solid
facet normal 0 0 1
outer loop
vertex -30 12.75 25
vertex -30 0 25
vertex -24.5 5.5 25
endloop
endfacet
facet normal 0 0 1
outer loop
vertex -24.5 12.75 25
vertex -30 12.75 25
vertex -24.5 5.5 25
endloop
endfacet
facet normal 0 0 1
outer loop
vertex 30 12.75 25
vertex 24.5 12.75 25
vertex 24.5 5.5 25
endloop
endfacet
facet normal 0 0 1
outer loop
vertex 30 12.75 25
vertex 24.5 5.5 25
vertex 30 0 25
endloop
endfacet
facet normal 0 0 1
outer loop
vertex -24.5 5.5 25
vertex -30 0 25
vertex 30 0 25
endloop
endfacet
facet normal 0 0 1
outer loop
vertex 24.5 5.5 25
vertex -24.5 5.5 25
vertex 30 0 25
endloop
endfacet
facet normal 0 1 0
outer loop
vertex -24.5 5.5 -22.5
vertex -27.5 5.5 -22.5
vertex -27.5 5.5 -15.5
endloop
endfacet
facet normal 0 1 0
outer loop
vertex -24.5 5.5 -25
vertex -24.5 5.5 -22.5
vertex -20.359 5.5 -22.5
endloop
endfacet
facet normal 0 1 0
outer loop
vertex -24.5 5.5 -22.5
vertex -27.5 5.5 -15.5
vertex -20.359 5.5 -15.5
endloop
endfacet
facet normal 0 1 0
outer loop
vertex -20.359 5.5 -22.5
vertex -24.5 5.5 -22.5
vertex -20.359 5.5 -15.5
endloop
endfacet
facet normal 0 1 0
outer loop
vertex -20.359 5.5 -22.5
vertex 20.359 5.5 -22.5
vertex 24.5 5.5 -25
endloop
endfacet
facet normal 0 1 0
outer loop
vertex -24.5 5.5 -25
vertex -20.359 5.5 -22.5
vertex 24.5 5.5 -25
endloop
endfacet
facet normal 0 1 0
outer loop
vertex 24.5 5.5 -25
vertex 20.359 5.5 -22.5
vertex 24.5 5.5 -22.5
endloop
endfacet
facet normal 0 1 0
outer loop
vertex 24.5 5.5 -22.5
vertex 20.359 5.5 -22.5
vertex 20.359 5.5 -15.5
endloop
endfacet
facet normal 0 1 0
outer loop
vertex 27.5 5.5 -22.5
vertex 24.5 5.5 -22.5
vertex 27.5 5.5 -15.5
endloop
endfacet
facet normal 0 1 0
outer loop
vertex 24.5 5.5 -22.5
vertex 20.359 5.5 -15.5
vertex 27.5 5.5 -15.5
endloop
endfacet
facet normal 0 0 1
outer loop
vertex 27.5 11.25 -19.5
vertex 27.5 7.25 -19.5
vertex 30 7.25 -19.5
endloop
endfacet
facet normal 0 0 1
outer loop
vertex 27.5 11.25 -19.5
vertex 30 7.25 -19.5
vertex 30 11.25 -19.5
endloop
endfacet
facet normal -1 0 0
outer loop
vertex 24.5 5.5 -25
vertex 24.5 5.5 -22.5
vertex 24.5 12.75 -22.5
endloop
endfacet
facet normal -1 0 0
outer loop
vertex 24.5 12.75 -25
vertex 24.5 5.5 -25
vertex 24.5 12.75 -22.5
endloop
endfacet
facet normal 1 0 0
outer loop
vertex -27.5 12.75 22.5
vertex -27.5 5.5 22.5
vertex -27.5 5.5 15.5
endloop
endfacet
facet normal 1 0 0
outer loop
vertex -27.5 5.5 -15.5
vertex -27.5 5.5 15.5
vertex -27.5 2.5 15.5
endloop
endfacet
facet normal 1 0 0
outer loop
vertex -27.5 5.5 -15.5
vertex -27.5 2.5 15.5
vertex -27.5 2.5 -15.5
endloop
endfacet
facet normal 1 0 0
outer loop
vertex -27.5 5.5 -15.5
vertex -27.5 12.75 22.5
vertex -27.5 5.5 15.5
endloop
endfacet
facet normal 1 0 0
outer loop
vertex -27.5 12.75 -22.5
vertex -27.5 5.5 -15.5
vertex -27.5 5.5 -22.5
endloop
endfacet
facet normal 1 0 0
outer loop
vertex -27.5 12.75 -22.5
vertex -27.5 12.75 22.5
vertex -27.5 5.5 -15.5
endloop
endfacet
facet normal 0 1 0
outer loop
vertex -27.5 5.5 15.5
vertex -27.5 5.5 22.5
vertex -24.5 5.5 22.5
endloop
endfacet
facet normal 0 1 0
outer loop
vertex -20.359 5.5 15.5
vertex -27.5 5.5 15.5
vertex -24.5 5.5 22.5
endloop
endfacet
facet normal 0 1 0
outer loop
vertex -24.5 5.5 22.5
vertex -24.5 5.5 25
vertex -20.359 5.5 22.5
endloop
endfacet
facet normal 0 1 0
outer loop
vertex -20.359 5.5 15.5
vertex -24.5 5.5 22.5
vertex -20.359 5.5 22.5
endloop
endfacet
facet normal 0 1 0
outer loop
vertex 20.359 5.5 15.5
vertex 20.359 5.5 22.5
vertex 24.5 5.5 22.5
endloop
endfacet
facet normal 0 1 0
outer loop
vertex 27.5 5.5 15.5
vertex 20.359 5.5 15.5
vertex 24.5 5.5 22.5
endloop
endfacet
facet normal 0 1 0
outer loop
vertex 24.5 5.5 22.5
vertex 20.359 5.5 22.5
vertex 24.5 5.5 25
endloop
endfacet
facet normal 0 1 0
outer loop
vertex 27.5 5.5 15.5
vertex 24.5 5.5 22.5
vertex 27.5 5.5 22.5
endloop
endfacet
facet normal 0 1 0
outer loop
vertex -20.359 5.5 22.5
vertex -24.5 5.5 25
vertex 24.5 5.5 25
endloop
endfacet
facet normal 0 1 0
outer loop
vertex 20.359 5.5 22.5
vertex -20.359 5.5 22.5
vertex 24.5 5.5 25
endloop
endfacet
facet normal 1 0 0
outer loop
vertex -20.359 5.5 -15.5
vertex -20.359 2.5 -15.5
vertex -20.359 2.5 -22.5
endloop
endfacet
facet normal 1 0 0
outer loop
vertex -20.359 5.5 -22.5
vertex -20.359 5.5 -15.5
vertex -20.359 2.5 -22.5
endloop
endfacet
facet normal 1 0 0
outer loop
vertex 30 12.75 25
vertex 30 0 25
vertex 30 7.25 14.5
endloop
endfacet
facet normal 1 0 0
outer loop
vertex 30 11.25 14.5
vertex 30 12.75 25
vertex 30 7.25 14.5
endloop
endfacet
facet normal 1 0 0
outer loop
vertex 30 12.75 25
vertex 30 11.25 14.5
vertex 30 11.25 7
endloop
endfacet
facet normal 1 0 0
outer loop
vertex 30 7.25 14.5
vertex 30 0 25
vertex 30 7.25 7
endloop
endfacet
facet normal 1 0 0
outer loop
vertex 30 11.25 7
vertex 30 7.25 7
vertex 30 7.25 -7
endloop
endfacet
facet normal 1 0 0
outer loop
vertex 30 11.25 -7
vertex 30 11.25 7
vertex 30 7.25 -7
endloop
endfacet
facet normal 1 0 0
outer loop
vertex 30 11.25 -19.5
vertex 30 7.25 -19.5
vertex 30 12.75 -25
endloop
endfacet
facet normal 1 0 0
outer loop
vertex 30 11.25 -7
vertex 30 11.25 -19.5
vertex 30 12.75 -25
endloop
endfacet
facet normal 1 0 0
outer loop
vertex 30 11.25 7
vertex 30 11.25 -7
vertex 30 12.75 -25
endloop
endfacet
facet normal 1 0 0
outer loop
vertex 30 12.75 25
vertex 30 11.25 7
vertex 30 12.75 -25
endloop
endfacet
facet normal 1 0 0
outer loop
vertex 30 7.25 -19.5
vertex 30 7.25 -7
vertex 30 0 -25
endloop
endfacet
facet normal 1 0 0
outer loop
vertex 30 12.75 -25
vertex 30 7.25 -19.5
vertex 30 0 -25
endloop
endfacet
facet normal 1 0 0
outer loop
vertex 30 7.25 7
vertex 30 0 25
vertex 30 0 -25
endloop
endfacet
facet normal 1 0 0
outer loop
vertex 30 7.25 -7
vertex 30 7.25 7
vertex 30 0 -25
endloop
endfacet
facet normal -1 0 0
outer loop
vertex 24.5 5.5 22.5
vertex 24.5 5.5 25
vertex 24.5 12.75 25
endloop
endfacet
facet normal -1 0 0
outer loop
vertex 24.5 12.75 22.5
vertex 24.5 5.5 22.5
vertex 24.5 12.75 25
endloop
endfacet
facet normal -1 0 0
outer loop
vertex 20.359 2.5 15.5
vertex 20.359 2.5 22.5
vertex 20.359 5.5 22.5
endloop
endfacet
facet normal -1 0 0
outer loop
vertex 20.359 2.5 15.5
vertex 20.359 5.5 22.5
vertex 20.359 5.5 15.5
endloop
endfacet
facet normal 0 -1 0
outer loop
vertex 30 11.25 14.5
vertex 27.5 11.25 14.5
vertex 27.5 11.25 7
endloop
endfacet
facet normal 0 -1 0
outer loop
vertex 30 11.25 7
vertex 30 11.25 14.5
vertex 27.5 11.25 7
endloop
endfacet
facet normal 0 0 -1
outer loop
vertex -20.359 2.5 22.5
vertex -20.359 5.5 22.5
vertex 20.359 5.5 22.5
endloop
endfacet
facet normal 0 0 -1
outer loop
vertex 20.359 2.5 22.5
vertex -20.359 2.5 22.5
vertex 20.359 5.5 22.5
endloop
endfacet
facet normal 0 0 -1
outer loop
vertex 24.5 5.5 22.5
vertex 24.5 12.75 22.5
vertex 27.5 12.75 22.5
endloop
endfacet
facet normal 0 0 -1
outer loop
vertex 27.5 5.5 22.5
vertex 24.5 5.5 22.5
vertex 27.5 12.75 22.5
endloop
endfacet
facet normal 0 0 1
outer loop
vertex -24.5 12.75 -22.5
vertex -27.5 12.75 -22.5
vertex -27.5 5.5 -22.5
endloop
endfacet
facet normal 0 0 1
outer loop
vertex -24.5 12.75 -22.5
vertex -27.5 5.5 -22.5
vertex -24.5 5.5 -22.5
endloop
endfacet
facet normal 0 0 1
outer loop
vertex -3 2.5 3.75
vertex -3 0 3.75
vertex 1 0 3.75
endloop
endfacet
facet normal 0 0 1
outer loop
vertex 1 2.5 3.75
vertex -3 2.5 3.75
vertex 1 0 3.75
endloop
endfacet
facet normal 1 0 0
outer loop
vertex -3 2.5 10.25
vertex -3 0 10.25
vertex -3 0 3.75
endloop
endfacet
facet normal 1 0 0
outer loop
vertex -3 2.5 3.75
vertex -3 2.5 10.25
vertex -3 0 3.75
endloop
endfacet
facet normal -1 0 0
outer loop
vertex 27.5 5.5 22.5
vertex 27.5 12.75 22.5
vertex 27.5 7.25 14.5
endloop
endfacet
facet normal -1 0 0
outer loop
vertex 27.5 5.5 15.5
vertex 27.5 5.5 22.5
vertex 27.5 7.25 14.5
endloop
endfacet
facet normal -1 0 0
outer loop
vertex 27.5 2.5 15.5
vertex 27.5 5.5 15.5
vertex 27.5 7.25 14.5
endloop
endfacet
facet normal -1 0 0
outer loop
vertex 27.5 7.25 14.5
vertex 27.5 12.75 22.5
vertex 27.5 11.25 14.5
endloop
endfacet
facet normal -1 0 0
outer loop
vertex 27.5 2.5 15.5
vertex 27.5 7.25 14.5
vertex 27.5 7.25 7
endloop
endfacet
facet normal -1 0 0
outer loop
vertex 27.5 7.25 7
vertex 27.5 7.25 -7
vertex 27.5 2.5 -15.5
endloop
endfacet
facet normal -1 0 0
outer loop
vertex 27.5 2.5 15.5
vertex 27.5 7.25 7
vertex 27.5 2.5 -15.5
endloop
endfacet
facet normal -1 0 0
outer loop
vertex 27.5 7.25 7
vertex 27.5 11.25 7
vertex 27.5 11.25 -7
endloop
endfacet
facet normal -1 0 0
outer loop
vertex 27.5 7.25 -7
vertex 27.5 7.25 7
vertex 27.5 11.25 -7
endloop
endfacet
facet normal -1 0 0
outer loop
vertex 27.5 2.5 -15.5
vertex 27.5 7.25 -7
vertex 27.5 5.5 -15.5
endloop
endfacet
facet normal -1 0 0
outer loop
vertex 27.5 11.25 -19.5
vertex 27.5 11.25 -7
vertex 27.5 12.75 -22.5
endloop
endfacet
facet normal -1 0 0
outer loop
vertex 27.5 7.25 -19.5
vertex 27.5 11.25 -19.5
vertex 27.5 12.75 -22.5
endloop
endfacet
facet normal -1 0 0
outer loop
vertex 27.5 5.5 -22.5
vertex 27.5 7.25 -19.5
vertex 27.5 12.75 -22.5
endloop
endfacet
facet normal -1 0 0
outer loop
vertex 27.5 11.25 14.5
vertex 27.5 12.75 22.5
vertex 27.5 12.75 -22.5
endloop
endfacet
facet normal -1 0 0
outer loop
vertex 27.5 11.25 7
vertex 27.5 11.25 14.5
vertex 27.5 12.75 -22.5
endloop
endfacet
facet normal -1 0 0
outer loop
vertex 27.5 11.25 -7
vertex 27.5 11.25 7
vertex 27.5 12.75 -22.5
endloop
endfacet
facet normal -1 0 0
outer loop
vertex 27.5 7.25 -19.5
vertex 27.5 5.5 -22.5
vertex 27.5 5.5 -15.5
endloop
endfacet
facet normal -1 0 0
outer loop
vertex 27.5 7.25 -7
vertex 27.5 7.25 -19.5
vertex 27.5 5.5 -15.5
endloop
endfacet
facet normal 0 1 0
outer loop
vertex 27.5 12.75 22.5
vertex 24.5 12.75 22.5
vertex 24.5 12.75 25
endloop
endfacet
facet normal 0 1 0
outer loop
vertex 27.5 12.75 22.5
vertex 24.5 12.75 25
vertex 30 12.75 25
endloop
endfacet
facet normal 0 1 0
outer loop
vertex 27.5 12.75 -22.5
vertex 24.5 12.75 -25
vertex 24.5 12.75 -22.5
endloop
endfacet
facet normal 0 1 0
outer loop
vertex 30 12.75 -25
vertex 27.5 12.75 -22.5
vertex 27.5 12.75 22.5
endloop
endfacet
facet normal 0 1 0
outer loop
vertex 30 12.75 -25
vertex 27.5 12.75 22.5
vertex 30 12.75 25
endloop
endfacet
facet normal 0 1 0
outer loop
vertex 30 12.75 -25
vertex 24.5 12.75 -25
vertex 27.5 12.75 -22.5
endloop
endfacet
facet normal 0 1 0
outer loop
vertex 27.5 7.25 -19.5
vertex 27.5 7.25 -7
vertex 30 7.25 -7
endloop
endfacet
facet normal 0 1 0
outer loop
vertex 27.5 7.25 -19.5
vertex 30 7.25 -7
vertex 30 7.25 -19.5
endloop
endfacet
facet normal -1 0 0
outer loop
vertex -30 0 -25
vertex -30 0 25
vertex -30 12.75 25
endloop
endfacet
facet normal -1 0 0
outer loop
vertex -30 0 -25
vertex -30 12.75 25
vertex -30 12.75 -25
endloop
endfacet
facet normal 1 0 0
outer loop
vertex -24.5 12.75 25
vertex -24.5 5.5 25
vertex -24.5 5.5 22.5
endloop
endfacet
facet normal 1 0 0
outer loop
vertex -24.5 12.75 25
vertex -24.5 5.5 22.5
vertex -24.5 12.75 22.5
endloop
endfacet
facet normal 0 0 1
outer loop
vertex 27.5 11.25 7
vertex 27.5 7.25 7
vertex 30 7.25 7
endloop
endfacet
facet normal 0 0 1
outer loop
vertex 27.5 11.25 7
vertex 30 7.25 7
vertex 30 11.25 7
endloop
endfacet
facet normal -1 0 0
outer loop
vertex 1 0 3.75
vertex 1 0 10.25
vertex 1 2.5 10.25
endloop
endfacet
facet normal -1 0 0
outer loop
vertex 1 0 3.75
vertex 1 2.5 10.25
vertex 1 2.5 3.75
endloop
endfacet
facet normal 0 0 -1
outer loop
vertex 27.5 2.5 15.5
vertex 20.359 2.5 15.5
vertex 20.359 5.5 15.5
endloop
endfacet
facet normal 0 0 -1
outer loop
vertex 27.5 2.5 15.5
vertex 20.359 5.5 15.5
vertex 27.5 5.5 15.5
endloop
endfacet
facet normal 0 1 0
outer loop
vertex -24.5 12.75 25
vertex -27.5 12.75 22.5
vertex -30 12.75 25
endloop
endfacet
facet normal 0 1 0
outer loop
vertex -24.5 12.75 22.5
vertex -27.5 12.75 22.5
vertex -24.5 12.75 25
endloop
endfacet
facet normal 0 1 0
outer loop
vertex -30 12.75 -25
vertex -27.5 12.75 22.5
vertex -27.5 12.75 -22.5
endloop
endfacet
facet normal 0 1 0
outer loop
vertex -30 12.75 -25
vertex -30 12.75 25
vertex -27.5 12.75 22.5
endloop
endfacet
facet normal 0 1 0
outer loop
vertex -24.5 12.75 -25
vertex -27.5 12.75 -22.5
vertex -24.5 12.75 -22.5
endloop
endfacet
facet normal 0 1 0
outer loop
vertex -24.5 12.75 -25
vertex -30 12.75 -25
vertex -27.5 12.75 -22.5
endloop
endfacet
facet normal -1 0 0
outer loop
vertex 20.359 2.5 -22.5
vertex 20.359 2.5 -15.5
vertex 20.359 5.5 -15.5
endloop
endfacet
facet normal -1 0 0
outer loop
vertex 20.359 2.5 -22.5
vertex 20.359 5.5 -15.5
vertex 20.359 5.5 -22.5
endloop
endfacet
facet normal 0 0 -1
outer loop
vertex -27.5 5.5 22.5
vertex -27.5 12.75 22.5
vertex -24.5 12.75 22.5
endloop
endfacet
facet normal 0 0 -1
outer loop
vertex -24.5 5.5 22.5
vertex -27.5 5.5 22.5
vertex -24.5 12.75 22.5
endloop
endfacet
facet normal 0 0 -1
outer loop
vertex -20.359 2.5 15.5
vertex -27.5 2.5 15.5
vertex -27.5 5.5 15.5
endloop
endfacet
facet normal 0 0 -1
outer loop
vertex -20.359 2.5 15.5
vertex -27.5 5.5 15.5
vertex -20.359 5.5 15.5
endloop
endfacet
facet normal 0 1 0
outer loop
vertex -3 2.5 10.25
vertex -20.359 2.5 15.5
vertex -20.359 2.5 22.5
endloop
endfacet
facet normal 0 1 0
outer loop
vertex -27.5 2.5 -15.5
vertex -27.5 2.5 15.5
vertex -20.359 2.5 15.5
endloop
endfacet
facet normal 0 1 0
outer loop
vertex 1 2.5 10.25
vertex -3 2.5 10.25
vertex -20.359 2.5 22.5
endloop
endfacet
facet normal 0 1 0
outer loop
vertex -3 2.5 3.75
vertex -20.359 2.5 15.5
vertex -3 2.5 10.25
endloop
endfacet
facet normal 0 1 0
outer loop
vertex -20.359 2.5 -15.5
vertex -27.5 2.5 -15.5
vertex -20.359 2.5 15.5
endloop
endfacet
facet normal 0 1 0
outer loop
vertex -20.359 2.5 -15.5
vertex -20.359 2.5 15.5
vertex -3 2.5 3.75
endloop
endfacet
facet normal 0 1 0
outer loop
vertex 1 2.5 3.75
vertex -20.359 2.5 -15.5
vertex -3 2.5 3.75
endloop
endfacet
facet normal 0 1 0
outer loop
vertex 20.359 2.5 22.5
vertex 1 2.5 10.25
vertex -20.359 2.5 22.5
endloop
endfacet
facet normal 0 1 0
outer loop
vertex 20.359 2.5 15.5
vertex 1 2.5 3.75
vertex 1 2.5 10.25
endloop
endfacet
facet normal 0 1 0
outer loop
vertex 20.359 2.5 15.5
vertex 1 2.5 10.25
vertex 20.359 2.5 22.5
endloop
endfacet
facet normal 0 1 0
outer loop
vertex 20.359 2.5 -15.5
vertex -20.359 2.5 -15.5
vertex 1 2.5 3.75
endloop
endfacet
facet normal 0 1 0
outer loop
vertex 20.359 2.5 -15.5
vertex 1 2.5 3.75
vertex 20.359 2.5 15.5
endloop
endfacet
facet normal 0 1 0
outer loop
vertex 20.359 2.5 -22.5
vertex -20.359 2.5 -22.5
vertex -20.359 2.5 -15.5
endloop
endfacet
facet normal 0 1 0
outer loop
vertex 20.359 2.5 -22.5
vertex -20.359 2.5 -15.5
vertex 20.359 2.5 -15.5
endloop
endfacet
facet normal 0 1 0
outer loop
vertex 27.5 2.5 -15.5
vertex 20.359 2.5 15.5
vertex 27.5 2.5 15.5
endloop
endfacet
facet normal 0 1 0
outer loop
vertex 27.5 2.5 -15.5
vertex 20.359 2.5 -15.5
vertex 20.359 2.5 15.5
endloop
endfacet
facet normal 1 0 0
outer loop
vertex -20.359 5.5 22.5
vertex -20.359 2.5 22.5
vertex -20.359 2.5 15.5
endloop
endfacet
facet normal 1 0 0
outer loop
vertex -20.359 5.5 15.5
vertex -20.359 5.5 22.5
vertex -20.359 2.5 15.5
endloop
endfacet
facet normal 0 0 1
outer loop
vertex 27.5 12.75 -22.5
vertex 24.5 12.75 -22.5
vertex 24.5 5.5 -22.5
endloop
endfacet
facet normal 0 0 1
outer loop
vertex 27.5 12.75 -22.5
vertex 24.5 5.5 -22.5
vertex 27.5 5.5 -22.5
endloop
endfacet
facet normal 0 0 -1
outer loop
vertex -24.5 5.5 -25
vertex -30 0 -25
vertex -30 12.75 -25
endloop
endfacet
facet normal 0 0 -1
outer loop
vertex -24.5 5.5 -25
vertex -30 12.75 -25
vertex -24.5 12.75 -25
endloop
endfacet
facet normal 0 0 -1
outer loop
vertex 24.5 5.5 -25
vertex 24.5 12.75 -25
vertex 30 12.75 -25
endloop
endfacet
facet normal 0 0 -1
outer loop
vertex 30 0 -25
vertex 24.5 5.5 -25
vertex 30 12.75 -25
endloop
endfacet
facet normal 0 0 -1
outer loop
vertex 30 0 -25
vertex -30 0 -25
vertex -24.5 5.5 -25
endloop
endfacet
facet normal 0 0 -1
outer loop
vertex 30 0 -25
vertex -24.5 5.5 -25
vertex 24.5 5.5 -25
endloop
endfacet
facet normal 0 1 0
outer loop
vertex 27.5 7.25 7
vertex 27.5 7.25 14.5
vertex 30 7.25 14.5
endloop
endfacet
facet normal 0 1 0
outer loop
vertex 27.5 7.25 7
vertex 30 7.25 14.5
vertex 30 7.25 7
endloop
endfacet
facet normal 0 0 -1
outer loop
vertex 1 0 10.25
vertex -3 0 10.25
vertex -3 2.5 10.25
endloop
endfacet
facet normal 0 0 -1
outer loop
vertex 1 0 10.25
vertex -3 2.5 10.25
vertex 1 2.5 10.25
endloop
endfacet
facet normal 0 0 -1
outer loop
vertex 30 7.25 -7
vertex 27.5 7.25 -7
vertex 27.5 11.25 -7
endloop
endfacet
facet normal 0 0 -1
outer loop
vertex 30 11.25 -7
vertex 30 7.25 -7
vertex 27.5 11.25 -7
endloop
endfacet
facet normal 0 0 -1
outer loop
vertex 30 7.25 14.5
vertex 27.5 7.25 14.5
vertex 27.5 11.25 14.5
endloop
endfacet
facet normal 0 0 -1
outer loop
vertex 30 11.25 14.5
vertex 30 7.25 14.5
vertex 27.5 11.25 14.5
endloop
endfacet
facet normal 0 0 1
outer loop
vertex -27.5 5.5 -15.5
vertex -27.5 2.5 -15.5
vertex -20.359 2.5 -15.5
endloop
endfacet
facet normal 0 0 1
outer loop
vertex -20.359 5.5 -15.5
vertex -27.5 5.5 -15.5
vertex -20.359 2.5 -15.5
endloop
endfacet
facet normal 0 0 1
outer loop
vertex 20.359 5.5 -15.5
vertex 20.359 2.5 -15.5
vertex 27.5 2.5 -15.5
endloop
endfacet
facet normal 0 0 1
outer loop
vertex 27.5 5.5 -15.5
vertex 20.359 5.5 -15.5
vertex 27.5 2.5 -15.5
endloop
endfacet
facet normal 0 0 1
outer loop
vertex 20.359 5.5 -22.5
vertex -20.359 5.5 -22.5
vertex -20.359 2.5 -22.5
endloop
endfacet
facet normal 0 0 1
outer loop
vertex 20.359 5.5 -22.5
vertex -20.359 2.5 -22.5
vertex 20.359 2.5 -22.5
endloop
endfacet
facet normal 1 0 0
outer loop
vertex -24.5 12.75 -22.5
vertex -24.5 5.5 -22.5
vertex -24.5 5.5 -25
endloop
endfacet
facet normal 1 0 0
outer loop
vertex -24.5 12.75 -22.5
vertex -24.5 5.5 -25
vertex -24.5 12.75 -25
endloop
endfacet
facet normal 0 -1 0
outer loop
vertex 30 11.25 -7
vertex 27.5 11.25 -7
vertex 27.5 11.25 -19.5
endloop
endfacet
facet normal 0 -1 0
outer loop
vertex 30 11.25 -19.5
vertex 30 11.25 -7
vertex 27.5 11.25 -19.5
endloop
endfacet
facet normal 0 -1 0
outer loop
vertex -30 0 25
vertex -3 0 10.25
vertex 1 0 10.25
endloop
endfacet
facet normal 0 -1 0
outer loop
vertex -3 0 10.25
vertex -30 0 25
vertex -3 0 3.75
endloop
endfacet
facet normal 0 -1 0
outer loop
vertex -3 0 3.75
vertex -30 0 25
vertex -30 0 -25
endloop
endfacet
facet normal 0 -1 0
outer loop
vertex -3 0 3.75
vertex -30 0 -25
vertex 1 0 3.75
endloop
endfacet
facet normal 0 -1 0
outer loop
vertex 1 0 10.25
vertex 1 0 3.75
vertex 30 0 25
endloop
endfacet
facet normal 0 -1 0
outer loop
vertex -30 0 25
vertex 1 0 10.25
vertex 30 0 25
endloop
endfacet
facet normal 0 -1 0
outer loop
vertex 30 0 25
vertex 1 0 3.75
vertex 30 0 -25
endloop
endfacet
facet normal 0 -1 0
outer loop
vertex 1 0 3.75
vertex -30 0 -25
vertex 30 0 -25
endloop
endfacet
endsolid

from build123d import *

# Parameters (mm, degrees)
CROQUIS1_W              = 60
CROQUIS1_H              = 50
SALIENTE_EXTRUIR1_DEPTH = 12.75
CORTAR_EXTRUIR2_START   = 12.75
CROQUIS2_W              = 55
CROQUIS2_H              = 45
CORTAR_EXTRUIR2_DEPTH   = 10.25
CROQUIS3_W              = 4
CROQUIS3_H              = 6.5
CORTAR_EXTRUIR3_DEPTH   = 10.25
CROQUIS5_W              = 49
CROQUIS5_H              = 7.25
CORTAR_EXTRUIR4_DEPTH   = 45.125
CROQUIS6_W              = 7.5
CROQUIS6_H              = 4
CROQUIS6_W_2            = 12.5
CORTAR_EXTRUIR5_DEPTH   = 60
CROQUIS8_W              = 7.141428429
CROQUIS8_H              = 7
SALIENTE_EXTRUIR6_DEPTH = 5.5


with BuildPart() as part:
    # Croquis1 → Saliente-Extruir1 (new body)
    with BuildSketch(Plane(origin=(0, 0, 0), x_dir=(1, 0, 0), z_dir=(0, 1, 0))):
        Rectangle(CROQUIS1_W, CROQUIS1_H)
    extrude(amount=SALIENTE_EXTRUIR1_DEPTH)

    # Croquis2 → Cortar-Extruir2 (cut)
    with BuildSketch(Plane(origin=(0, 0, 0), x_dir=(1, 0, 0), z_dir=(0, 1, 0)).offset(CORTAR_EXTRUIR2_START)):
        Rectangle(CROQUIS2_W, CROQUIS2_H)
    extrude(amount=-CORTAR_EXTRUIR2_DEPTH, mode=Mode.SUBTRACT)

    # Croquis3 → Cortar-Extruir3 (cut)
    with BuildSketch(Plane(origin=(0, 0, 0), x_dir=(1, 0, 0), z_dir=(0, 1, 0))):
        with Locations((-1, -7)):
            Rectangle(CROQUIS3_W, CROQUIS3_H)
    extrude(amount=CORTAR_EXTRUIR3_DEPTH, mode=Mode.SUBTRACT)

    # Croquis5 → Cortar-Extruir4 (cut, symmetric)
    with BuildSketch(Plane.XY):
        with Locations((0, 9.125)):
            Rectangle(CROQUIS5_W, CROQUIS5_H)
    extrude(amount=CORTAR_EXTRUIR4_DEPTH, both=True, mode=Mode.SUBTRACT)

    # Croquis6 → Cortar-Extruir5 (cut)
    with BuildSketch(Plane(origin=(0, 0, 0), x_dir=(0, 0, -1), z_dir=(1, 0, 0))):
        with Locations((-10.75, 9.25)):
            Rectangle(CROQUIS6_W, CROQUIS6_H)
        with Locations((13.25, 9.25)):
            Rectangle(CROQUIS6_W_2, CROQUIS6_H)
    extrude(amount=CORTAR_EXTRUIR5_DEPTH, mode=Mode.SUBTRACT)

    # Croquis8 → Saliente-Extruir6 (add)
    with BuildSketch(Plane(origin=(0, 0, 0), x_dir=(1, 0, 0), z_dir=(0, 1, 0))):
        with Locations((23.929285785, -19)):
            Rectangle(CROQUIS8_W, CROQUIS8_H)
        with Locations((-23.929285785, -19)):
            Rectangle(CROQUIS8_W, CROQUIS8_H)
        with Locations((23.929285785, 19)):
            Rectangle(CROQUIS8_W, CROQUIS8_H)
        with Locations((-23.929285785, 19)):
            Rectangle(CROQUIS8_W, CROQUIS8_H)
    extrude(amount=SALIENTE_EXTRUIR6_DEPTH)


solid = part.part
